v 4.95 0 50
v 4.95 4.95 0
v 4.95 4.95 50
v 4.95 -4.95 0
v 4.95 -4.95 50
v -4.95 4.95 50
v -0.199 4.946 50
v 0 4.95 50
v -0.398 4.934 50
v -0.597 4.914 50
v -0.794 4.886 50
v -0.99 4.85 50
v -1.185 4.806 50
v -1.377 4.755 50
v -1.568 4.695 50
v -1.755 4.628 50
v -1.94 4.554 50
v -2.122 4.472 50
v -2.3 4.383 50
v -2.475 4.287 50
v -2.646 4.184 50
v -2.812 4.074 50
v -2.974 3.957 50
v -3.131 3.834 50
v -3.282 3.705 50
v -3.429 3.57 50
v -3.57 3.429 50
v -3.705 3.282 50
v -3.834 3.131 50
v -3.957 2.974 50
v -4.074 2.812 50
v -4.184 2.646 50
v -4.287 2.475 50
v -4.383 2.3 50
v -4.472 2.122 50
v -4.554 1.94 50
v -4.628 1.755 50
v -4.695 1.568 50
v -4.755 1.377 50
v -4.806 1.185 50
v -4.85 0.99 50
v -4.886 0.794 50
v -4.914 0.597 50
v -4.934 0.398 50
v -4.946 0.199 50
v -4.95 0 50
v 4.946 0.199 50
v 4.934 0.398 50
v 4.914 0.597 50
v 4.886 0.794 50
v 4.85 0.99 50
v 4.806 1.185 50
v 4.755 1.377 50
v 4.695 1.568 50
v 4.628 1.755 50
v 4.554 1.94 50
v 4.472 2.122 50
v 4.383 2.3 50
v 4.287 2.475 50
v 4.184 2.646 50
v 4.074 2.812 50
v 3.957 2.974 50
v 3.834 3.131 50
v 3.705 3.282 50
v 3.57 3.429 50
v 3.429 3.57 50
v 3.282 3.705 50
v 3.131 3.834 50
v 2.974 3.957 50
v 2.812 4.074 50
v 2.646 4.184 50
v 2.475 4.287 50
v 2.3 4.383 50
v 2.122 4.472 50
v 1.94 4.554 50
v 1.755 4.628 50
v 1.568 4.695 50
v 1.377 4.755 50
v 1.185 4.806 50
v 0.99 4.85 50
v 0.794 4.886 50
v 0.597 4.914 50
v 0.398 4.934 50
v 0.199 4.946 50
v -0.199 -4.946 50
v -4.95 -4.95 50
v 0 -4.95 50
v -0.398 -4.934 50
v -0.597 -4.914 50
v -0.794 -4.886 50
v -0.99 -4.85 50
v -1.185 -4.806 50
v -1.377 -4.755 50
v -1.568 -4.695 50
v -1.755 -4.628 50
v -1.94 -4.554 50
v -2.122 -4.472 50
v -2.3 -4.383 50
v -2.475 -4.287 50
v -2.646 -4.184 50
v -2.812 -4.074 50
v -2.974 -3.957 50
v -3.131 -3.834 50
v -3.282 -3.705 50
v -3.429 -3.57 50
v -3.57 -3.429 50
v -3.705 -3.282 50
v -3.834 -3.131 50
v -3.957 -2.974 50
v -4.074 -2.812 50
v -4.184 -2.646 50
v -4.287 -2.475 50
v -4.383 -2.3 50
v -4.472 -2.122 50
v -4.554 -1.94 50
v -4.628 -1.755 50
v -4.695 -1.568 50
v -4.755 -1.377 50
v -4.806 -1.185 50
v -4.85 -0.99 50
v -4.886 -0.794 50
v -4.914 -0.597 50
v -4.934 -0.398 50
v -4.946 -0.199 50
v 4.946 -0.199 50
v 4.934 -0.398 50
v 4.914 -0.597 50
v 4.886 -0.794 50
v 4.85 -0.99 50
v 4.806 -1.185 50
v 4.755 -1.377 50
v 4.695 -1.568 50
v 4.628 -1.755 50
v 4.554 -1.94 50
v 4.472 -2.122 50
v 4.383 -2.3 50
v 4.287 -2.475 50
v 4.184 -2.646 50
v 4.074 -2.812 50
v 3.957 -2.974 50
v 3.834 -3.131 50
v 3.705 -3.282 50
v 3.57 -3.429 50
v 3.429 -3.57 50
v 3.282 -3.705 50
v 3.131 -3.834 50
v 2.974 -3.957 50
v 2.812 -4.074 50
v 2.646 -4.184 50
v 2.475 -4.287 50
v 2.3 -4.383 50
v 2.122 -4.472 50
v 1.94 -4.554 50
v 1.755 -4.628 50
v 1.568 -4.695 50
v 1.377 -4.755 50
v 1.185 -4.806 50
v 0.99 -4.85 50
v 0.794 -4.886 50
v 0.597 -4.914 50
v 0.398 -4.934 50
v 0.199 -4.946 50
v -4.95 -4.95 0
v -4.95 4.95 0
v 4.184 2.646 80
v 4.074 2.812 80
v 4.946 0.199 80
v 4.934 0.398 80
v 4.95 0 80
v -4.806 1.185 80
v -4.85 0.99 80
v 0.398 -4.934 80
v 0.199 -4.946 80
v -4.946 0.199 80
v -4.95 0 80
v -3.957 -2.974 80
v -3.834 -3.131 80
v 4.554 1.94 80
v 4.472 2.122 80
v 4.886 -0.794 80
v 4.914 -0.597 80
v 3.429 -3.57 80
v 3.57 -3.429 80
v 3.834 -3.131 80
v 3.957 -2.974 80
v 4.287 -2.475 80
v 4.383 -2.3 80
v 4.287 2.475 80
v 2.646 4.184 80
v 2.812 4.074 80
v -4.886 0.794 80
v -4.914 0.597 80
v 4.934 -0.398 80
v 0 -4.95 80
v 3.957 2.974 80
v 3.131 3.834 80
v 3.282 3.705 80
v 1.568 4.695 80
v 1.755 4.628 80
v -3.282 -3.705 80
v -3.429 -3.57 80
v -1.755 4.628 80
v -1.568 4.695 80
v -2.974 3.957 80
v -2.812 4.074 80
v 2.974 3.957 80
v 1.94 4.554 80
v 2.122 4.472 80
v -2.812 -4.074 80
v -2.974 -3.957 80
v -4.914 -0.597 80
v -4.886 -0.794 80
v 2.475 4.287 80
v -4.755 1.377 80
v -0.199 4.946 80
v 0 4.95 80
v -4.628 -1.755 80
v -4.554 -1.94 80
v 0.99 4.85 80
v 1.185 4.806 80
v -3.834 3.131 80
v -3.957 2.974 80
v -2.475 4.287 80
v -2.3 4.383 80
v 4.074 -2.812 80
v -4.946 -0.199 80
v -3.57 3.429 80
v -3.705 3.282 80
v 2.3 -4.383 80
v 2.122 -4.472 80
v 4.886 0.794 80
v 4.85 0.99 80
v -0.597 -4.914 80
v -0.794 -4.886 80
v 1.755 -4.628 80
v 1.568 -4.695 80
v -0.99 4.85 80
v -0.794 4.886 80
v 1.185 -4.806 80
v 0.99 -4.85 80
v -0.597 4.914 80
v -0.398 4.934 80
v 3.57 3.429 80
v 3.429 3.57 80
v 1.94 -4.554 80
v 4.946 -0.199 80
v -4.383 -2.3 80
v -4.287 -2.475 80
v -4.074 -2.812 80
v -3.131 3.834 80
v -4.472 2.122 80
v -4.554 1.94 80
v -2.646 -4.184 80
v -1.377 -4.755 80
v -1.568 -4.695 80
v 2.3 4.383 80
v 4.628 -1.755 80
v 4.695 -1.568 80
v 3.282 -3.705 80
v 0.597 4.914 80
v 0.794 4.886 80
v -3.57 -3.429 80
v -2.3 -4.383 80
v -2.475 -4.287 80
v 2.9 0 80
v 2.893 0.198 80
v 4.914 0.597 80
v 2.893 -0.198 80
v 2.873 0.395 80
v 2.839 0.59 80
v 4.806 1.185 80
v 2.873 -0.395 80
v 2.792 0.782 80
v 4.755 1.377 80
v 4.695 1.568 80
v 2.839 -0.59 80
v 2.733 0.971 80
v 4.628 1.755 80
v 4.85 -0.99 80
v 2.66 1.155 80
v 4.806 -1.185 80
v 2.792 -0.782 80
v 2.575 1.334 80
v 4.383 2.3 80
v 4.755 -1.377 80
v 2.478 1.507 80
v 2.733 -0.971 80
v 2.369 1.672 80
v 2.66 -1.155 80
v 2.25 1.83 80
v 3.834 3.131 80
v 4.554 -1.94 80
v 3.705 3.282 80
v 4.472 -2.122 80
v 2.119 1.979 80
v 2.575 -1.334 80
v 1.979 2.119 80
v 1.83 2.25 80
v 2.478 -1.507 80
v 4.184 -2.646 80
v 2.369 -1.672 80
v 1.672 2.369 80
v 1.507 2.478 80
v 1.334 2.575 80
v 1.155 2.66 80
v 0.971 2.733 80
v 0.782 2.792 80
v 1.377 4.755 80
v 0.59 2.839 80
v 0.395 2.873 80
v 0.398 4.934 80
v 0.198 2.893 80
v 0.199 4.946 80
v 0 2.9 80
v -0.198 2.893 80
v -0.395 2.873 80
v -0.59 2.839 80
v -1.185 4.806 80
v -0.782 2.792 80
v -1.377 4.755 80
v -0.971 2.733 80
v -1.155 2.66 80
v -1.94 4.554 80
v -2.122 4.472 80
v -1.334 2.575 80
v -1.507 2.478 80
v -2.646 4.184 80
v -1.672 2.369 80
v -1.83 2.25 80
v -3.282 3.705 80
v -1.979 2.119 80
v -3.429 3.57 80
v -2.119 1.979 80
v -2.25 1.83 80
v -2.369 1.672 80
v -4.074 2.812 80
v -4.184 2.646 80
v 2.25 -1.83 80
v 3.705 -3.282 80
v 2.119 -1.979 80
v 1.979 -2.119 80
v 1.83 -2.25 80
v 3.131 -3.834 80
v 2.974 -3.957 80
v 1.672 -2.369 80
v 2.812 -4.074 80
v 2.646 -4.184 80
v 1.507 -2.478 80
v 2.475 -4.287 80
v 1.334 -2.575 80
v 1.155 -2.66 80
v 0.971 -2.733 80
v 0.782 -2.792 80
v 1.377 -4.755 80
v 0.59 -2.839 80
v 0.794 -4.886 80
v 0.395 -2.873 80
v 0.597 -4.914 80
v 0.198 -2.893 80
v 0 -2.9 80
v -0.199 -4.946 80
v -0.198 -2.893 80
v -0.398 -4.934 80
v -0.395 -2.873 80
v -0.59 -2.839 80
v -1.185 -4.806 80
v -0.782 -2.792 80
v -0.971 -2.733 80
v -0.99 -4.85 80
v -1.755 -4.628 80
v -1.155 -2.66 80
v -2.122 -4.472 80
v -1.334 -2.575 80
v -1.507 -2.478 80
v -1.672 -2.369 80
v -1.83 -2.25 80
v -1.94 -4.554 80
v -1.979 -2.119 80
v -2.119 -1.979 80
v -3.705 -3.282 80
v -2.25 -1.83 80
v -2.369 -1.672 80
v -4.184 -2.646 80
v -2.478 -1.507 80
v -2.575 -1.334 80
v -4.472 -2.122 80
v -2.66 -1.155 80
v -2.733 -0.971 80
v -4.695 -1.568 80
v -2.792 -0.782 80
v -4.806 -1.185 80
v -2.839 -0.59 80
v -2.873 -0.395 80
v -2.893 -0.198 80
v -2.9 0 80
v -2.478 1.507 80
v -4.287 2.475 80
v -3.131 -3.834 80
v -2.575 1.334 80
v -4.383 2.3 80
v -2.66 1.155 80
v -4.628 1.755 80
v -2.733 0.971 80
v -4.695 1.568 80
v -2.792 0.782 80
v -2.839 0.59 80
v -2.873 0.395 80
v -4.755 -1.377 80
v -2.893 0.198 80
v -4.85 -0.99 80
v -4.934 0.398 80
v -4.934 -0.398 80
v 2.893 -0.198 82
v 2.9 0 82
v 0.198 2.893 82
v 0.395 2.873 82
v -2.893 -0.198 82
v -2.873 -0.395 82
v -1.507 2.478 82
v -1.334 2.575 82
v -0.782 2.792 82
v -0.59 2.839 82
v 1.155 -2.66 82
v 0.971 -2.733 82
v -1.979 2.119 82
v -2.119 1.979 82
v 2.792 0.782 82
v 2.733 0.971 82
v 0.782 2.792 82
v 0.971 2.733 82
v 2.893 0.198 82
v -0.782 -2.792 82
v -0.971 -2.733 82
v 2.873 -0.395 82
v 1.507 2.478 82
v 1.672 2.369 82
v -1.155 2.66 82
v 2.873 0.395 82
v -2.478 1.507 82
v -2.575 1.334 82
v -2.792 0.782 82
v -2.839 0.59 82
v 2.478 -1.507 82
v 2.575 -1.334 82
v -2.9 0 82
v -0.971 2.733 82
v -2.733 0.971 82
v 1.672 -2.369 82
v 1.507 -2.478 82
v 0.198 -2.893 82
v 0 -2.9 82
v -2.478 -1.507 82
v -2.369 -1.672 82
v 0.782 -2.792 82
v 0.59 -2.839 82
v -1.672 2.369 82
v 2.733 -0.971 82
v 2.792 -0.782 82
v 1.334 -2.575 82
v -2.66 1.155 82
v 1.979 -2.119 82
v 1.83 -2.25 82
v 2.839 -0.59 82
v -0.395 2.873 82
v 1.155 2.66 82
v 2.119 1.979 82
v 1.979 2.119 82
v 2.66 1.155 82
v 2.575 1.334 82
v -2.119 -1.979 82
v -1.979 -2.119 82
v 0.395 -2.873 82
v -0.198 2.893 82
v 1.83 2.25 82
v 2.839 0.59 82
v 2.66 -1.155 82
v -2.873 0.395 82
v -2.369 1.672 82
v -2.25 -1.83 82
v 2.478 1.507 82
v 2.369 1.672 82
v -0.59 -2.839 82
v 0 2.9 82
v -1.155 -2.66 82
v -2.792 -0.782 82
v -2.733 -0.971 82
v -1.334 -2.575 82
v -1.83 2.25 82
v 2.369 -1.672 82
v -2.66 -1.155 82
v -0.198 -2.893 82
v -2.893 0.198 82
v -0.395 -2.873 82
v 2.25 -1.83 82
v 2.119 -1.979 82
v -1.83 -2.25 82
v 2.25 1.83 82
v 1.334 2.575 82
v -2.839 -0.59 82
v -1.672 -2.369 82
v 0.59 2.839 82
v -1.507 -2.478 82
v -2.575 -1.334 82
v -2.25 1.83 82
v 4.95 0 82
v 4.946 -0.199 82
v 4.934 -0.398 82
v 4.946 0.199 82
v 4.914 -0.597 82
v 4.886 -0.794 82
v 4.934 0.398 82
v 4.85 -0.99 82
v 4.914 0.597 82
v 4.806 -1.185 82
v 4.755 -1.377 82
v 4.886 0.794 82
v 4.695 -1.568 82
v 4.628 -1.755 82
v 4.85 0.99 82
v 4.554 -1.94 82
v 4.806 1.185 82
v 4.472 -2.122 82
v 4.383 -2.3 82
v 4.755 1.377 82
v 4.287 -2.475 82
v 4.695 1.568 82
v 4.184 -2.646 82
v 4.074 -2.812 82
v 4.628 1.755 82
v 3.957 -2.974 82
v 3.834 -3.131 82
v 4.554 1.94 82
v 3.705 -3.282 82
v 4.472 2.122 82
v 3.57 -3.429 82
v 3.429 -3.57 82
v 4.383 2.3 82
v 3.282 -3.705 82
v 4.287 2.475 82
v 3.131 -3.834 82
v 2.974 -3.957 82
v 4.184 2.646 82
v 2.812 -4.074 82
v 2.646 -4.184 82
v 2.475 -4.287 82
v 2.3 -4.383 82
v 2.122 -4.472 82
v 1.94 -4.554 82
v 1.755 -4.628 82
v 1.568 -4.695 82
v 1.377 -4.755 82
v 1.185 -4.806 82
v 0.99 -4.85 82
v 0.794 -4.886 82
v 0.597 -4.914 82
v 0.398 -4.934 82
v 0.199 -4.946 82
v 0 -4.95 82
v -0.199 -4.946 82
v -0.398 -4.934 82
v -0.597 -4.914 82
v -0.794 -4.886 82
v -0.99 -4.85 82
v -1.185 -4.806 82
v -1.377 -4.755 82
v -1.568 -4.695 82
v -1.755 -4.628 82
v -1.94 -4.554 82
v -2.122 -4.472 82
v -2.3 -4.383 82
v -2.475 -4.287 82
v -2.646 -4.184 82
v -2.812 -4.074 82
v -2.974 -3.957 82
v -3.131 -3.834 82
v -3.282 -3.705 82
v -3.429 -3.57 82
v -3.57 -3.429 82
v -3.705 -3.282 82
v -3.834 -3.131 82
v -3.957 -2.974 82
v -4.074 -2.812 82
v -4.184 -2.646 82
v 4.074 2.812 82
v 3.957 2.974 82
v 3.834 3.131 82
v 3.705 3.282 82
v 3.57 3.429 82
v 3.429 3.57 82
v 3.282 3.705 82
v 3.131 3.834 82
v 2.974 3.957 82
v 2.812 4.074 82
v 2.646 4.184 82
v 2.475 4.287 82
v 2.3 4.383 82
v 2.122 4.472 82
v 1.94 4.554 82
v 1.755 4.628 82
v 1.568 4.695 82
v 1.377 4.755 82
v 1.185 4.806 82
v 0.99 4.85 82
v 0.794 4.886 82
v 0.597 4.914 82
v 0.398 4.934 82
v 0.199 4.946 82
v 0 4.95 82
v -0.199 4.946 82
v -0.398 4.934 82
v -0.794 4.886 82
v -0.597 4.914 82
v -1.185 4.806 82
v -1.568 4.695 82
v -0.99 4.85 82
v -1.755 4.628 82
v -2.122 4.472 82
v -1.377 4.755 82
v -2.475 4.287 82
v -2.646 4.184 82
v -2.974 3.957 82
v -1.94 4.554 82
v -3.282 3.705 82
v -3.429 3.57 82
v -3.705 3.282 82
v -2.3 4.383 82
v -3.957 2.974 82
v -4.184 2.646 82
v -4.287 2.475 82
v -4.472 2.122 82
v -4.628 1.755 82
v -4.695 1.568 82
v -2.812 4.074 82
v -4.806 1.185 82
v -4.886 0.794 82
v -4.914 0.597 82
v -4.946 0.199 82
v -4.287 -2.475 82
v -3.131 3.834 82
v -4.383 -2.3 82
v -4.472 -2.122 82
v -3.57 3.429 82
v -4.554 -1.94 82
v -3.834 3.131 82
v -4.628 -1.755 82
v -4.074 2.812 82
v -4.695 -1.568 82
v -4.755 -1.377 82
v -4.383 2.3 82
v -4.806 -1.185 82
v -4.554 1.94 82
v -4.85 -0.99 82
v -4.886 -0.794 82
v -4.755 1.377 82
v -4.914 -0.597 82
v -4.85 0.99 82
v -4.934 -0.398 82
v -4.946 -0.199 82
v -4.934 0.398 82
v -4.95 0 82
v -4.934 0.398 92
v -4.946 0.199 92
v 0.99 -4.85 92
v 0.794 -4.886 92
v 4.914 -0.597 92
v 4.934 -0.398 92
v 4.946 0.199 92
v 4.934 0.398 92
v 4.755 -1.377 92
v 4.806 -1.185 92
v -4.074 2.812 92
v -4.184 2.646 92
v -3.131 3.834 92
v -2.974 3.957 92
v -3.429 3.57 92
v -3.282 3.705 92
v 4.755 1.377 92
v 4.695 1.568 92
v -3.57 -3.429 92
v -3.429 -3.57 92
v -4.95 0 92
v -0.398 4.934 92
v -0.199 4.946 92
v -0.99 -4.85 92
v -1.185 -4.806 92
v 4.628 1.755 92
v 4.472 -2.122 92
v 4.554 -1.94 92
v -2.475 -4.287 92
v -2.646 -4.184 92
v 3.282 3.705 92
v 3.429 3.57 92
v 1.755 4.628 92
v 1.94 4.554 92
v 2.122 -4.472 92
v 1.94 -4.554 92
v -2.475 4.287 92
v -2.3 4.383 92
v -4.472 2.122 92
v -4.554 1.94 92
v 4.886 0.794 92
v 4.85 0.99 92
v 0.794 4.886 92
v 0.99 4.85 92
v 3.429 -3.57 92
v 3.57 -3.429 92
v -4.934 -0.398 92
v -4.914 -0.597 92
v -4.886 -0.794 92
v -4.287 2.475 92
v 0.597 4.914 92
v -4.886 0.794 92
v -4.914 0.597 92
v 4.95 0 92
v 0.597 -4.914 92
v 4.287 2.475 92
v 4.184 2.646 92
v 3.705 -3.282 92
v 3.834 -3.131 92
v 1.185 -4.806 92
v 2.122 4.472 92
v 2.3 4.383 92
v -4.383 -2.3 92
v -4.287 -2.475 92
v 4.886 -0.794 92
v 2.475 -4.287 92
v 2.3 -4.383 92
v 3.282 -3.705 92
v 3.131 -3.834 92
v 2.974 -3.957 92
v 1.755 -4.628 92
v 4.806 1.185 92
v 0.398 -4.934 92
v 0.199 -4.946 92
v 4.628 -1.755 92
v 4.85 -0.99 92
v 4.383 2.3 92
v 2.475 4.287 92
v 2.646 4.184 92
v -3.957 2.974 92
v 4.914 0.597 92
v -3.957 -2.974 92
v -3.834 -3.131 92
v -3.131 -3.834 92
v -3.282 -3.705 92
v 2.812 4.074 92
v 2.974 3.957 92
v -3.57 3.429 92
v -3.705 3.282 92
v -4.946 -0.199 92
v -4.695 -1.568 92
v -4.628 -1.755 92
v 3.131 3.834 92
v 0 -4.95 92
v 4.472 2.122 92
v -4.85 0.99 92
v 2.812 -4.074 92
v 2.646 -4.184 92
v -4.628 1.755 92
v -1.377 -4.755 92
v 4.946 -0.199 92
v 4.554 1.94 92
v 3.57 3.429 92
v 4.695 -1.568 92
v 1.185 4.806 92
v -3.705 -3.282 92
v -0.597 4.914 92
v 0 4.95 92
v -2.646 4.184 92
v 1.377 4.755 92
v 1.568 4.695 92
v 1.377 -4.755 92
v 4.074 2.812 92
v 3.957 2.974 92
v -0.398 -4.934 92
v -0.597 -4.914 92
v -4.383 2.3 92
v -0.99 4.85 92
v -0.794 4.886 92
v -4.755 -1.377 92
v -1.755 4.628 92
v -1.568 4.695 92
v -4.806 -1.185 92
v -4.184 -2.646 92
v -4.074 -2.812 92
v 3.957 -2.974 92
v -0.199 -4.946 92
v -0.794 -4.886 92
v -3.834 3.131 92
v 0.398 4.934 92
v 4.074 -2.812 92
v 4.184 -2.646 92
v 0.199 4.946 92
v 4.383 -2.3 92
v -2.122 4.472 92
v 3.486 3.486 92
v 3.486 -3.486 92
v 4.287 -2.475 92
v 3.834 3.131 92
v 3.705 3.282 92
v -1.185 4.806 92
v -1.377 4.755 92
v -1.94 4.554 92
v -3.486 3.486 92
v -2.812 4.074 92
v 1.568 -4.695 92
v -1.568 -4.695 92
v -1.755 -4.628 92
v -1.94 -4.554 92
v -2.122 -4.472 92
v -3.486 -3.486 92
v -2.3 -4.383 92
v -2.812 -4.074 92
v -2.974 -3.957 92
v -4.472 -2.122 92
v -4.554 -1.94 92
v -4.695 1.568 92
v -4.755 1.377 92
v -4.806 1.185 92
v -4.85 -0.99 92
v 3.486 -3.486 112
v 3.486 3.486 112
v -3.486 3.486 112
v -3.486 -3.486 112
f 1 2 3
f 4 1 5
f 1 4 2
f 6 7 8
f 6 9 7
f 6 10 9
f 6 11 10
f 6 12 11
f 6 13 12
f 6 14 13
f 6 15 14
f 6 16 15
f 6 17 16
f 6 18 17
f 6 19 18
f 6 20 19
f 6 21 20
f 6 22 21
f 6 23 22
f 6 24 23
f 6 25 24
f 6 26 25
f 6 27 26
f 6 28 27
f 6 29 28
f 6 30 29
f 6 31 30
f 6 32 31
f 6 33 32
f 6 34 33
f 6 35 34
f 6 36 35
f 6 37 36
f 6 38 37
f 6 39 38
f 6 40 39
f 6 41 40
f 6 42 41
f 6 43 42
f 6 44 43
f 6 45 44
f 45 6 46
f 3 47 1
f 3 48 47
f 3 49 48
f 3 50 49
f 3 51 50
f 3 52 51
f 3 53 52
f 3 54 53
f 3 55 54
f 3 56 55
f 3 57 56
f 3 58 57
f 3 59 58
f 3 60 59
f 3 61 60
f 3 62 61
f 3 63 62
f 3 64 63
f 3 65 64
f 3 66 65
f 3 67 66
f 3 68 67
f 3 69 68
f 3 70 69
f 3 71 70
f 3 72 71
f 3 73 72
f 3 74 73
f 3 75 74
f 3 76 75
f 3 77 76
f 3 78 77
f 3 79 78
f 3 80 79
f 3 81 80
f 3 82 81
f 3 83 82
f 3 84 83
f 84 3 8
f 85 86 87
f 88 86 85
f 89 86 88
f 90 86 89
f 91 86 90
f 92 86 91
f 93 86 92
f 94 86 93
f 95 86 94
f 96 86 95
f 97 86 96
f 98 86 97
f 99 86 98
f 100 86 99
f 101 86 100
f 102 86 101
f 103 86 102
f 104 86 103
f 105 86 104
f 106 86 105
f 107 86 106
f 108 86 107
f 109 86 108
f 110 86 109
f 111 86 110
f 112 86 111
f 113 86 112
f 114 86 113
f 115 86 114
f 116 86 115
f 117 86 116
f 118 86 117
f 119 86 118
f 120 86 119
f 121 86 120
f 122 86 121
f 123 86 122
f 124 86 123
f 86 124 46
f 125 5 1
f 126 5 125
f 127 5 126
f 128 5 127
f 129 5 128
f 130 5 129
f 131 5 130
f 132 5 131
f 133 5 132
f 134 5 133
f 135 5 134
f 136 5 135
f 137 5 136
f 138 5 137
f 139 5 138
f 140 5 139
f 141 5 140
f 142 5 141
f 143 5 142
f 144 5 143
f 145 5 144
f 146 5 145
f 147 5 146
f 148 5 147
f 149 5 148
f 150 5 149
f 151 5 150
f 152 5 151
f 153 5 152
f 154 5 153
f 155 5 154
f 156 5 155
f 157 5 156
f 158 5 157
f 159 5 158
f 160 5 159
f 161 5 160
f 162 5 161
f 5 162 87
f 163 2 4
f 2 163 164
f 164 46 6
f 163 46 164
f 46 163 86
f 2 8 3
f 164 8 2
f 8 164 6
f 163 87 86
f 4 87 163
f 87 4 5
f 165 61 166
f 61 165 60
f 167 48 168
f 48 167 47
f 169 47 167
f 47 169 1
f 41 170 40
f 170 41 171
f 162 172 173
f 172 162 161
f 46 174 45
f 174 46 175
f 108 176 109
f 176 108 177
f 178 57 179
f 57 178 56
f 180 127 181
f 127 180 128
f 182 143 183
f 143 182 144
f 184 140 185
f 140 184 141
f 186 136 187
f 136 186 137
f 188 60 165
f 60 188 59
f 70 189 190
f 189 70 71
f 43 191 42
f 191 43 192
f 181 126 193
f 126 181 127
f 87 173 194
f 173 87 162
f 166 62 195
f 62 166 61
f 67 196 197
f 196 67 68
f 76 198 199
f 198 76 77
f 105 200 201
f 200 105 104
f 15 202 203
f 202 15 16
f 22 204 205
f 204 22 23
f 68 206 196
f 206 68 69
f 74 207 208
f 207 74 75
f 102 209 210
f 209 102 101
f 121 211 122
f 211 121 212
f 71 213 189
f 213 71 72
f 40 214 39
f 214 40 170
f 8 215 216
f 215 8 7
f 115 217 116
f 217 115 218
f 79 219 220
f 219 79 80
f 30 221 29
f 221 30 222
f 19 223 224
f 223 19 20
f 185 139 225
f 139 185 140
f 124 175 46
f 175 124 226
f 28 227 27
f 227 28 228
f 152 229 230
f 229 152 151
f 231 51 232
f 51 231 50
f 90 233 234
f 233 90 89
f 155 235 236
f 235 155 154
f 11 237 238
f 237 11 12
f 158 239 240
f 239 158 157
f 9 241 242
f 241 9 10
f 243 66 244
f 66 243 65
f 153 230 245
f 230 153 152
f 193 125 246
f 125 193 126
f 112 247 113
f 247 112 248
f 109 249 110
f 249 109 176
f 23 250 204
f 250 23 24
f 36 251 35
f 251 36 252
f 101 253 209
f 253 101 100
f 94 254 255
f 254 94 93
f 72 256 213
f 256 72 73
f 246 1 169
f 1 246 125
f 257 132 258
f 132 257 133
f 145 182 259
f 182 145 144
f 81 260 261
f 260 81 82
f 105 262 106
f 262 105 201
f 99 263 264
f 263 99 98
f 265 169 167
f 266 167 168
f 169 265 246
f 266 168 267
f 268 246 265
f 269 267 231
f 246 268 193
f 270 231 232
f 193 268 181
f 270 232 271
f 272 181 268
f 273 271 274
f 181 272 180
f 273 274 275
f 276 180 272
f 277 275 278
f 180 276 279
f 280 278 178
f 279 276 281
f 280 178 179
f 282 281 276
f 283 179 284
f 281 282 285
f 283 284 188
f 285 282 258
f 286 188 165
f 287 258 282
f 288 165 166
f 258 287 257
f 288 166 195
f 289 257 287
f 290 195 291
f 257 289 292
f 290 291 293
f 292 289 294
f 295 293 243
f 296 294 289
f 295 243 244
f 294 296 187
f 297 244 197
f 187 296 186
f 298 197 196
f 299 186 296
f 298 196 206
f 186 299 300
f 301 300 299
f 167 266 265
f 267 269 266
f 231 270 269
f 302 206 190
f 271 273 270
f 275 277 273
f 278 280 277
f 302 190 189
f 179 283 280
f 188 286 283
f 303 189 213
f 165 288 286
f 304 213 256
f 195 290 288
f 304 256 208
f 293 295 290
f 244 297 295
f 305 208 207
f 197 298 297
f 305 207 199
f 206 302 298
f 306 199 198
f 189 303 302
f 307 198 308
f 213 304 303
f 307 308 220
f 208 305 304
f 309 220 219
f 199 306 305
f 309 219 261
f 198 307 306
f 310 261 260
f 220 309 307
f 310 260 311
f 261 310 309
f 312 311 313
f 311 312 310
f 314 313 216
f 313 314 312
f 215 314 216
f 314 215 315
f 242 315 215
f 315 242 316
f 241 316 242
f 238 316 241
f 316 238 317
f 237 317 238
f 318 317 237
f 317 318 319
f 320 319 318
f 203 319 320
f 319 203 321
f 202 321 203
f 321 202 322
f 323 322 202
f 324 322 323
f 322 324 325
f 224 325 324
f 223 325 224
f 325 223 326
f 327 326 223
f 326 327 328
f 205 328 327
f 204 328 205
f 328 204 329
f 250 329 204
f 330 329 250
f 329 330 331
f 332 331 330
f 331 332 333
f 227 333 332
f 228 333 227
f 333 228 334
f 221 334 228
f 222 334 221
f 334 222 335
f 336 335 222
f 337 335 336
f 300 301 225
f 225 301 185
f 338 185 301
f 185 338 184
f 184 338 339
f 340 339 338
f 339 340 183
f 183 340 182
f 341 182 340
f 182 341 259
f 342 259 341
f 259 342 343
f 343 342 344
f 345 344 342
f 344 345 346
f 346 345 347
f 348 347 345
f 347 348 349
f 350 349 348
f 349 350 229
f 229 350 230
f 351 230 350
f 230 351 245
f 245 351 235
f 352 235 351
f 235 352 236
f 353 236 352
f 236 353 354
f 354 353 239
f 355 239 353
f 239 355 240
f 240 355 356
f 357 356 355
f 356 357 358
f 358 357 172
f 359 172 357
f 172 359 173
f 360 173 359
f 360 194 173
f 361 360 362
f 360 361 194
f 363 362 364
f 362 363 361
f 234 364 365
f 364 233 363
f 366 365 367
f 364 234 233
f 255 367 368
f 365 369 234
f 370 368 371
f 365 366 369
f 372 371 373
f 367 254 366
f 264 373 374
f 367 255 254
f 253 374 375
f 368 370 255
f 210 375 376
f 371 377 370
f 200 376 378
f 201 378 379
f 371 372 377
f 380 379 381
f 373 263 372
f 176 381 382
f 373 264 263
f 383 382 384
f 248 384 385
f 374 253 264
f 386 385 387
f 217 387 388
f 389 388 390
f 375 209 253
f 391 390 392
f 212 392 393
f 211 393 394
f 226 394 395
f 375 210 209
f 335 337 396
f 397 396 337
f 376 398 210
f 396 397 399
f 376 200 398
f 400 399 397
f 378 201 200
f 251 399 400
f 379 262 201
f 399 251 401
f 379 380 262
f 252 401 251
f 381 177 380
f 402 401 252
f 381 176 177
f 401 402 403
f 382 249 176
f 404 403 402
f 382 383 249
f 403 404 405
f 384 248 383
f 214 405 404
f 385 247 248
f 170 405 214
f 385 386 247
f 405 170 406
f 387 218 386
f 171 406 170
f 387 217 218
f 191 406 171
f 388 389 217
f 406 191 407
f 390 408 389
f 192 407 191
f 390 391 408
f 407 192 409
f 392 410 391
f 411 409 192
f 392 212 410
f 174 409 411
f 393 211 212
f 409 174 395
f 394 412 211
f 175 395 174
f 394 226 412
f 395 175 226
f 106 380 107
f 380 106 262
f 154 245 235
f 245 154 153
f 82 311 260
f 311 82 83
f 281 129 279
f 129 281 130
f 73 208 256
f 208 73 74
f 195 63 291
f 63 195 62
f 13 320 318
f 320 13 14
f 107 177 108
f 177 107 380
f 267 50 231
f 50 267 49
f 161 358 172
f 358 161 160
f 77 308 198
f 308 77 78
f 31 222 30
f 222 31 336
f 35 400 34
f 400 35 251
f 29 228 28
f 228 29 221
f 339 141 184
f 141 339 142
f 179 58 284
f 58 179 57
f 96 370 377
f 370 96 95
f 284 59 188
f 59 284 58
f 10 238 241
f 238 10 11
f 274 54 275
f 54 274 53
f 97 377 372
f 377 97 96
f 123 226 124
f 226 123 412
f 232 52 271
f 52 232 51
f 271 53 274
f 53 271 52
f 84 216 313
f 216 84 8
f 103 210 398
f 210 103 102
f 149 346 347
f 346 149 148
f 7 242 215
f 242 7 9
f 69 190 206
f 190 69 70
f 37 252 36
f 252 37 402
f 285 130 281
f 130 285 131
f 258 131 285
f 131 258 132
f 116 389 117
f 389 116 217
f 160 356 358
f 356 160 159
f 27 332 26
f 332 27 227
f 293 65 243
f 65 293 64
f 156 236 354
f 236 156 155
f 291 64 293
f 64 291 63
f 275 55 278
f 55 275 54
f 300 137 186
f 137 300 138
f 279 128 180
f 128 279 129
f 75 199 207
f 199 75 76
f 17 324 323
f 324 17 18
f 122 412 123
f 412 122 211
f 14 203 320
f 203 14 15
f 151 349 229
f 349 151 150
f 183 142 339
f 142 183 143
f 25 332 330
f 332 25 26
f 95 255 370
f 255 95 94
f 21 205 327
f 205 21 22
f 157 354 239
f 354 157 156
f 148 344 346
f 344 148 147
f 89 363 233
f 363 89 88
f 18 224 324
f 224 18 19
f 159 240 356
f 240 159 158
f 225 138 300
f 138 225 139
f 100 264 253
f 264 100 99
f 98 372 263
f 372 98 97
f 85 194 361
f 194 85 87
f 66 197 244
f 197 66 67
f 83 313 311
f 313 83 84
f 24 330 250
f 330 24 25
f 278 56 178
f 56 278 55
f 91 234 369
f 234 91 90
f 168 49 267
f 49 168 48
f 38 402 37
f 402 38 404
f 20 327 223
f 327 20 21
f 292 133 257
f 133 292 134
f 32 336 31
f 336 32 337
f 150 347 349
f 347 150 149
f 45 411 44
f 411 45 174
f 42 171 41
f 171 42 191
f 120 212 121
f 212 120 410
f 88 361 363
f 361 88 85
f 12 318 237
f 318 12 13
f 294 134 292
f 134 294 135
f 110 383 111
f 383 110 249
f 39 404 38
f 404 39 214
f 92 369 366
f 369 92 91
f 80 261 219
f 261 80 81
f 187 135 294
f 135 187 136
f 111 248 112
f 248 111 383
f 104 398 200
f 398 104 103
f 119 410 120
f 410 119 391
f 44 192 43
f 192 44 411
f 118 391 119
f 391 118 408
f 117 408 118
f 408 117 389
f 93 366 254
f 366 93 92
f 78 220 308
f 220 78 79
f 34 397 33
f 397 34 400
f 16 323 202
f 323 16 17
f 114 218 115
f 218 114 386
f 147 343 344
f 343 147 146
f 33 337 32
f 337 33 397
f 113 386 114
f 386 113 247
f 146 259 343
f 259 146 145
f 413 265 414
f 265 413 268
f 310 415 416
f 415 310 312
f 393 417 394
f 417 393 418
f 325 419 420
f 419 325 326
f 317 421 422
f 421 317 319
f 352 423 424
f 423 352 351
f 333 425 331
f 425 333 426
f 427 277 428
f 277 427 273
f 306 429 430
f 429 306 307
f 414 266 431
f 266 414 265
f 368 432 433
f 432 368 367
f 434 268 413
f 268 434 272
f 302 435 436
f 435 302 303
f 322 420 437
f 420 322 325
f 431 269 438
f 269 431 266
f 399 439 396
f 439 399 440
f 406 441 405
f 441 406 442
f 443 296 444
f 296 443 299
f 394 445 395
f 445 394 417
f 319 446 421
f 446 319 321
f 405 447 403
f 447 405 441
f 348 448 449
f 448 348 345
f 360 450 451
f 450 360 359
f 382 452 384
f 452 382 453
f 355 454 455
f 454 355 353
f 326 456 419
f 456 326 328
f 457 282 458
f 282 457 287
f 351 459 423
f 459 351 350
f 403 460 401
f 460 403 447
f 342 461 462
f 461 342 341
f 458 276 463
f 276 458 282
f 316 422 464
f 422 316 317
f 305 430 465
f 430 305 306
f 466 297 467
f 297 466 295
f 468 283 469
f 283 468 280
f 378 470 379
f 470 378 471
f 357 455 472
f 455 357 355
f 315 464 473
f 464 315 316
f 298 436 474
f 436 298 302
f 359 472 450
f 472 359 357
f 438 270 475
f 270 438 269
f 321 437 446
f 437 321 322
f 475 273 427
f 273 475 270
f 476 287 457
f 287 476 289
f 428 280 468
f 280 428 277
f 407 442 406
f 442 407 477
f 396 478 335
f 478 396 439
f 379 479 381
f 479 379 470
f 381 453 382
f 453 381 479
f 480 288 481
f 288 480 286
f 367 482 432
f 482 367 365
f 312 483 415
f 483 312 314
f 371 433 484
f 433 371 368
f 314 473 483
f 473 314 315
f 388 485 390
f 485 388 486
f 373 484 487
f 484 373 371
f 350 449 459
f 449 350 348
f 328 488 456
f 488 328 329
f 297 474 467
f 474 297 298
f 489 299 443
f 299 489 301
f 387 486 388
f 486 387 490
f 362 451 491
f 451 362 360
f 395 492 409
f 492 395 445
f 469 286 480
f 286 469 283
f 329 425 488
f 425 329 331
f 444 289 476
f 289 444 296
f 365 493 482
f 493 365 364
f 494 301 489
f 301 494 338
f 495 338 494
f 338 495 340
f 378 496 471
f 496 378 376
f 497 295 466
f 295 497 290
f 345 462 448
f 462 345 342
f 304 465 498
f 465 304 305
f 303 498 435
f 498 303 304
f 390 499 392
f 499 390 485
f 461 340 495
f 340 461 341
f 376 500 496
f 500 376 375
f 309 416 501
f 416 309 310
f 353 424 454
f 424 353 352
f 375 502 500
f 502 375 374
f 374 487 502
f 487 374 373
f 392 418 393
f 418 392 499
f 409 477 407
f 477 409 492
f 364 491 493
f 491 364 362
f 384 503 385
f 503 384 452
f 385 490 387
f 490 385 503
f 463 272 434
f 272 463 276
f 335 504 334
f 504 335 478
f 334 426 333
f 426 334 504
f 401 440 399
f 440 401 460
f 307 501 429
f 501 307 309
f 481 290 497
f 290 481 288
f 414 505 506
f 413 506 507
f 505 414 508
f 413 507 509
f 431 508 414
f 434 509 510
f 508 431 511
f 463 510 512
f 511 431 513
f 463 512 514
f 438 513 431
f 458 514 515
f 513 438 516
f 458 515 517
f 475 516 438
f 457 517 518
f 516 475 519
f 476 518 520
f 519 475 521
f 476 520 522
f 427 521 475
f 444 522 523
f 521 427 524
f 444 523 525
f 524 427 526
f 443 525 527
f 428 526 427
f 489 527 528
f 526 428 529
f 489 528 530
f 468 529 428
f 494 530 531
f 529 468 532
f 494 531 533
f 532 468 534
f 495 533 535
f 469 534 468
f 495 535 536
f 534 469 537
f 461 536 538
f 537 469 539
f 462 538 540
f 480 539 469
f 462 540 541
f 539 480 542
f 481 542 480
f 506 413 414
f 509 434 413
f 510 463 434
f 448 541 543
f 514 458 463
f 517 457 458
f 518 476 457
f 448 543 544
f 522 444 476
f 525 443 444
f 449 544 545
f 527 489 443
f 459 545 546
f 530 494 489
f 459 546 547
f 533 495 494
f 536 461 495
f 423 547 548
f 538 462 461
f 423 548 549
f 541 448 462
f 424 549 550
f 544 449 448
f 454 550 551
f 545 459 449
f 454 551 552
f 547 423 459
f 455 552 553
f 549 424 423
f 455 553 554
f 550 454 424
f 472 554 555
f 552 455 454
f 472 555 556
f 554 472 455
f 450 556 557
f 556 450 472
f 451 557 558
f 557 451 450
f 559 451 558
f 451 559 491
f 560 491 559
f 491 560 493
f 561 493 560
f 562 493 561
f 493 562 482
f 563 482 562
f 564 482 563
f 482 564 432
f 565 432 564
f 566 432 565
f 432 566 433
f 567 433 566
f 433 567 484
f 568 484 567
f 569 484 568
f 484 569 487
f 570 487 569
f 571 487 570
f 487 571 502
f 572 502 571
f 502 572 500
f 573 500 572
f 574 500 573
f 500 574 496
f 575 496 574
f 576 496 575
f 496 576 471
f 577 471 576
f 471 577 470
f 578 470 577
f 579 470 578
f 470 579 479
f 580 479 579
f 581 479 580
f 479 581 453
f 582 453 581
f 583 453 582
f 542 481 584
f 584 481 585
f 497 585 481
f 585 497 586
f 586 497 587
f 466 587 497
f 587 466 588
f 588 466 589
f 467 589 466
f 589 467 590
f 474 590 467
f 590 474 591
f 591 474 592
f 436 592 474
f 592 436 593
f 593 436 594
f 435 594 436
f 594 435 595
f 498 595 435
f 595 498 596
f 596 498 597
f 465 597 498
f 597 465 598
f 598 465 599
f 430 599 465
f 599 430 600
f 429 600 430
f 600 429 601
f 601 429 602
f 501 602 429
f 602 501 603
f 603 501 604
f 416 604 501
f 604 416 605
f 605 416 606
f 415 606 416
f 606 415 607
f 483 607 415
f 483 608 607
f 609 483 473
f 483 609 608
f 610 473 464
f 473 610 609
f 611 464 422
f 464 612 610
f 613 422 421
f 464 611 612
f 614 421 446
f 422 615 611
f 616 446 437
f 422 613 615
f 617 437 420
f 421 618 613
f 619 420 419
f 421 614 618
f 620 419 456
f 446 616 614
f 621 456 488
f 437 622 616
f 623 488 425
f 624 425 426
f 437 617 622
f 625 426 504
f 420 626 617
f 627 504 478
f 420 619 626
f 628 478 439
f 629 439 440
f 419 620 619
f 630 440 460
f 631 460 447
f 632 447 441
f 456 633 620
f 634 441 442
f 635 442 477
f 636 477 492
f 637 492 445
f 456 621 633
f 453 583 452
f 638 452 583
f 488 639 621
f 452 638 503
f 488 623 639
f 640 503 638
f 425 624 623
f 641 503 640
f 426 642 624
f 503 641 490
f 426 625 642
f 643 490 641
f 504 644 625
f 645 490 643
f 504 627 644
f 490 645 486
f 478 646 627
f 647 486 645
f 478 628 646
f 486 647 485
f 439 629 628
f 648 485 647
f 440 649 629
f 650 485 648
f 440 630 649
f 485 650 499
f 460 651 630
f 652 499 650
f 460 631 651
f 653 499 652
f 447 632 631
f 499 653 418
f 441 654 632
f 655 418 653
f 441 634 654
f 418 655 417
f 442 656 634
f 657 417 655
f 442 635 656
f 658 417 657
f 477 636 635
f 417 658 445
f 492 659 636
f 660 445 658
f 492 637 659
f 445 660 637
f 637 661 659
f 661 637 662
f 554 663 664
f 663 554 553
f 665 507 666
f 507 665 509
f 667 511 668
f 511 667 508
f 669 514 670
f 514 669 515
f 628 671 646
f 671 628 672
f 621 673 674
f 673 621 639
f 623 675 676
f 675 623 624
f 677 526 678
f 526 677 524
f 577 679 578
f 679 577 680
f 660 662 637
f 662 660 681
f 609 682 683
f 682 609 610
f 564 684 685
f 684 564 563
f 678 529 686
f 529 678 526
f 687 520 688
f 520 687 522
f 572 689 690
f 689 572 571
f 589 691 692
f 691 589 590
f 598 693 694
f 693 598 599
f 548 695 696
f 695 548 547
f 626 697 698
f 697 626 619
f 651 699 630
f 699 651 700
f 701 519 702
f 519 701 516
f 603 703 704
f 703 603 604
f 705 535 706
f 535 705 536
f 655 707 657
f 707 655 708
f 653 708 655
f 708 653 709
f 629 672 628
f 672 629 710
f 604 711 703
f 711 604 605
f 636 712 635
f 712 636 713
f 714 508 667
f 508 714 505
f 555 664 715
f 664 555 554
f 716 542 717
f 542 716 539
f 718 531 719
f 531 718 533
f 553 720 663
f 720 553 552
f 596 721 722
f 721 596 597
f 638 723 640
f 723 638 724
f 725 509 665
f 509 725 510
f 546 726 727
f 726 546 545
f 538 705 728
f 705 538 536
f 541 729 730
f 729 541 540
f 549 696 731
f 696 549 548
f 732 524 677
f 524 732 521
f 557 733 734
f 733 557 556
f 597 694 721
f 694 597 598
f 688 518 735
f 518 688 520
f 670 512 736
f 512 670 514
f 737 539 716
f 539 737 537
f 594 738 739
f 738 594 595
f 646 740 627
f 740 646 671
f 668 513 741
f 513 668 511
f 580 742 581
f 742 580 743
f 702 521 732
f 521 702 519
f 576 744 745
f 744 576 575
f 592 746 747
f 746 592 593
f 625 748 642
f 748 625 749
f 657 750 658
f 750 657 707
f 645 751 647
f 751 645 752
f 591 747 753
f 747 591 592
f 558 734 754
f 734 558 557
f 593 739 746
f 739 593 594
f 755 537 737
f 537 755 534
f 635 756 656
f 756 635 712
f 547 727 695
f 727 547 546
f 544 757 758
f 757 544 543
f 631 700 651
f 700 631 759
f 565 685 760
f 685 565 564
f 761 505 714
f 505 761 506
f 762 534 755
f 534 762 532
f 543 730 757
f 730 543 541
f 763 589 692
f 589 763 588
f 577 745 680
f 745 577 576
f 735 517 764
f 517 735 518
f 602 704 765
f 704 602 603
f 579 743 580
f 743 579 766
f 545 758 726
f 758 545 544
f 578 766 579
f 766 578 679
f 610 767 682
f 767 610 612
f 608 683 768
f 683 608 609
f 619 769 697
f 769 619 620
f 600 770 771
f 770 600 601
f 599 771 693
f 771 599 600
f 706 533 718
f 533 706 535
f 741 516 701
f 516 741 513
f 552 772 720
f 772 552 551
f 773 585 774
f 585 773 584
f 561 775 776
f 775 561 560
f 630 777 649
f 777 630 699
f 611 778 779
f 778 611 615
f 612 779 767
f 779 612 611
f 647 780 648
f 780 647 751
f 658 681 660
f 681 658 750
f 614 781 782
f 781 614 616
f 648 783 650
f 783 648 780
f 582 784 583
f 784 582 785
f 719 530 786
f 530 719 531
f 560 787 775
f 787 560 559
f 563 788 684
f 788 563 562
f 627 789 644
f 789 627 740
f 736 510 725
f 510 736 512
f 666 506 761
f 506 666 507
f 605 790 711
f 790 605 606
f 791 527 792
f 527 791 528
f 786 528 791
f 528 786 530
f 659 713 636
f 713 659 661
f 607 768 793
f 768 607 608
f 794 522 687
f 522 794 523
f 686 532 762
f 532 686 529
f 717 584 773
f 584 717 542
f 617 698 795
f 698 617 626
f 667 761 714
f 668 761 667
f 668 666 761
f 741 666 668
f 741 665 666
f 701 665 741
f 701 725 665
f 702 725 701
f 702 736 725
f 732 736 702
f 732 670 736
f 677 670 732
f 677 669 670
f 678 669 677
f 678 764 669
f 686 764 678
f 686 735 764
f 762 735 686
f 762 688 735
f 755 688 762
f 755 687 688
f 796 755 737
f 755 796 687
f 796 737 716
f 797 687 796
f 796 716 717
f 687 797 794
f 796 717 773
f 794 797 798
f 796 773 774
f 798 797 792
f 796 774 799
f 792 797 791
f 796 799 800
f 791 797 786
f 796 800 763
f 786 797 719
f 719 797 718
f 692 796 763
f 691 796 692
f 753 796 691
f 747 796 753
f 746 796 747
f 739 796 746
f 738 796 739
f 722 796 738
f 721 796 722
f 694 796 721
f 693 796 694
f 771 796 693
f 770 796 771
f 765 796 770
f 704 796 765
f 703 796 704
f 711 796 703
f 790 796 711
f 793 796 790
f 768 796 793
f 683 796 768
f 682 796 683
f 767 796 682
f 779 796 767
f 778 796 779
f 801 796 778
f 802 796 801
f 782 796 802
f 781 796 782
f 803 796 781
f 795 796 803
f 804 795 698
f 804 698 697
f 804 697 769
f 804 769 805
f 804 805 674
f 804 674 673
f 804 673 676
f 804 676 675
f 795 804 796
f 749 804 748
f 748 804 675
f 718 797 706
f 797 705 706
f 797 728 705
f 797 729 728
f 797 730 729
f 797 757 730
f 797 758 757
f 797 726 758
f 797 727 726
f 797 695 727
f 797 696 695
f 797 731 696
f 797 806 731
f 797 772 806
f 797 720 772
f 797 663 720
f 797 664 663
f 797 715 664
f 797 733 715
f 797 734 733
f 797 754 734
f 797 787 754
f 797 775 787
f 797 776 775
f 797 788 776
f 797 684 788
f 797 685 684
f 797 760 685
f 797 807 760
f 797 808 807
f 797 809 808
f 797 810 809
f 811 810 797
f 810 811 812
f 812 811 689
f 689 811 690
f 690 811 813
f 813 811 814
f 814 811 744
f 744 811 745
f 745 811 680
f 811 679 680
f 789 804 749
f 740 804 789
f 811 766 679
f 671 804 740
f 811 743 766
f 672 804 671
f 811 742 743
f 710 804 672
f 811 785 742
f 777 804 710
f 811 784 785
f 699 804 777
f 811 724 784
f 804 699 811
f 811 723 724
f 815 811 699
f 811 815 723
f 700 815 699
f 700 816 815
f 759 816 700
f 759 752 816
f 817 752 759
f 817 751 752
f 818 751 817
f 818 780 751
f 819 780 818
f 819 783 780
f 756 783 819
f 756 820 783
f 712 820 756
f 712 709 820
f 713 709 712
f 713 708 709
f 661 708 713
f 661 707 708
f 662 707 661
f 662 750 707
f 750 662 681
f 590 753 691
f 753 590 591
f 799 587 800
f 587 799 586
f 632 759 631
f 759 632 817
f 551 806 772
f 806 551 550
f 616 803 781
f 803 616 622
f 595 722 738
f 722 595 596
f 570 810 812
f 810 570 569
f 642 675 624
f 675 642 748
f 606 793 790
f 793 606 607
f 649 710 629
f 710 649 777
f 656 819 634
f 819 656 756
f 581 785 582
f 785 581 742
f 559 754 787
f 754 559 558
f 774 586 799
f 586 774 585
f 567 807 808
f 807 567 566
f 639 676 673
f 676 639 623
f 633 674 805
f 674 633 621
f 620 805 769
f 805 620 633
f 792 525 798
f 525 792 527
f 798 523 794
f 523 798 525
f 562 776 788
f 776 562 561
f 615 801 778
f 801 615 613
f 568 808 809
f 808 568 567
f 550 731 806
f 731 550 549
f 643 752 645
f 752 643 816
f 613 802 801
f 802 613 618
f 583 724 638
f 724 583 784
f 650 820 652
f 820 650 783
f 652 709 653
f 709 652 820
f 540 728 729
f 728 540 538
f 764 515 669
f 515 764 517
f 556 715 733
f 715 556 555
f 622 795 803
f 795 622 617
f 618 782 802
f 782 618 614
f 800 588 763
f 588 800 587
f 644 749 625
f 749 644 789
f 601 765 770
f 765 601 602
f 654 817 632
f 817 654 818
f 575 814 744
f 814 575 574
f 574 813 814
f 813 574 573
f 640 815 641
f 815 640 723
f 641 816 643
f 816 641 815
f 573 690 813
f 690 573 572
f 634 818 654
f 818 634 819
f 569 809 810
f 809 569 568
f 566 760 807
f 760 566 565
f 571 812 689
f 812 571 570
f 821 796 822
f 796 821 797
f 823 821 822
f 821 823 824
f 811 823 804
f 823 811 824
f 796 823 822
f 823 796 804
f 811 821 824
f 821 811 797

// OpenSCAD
// file: config.scad
$fa = 1;
$fs = 0.2;

bearing_outer_dia = 22;
bearing_inner_dia = 10;
bearing_padding = 8;

casing_width = 10;

post_height = 100;
post_base_height = 20;
post_groove_width = 4;
post_groove_depth = 4;
post_groove_offset = 4;

base_margin = 5;
post_base_width = casing_width;
post_length = 2*(post_groove_offset + post_groove_depth + bearing_padding) + bearing_outer_dia;
post_separation = 210;

base_length = post_length + 2 * base_margin;
base_width = post_separation + 2 * base_margin;
base_height = 10;

// groove to groove distance
casing_length = 2*(post_groove_depth + bearing_padding) + bearing_outer_dia;
casing_height = 1.5 * bearing_padding + bearing_outer_dia;

roller_width = 200;
roller_padding = post_separation - roller_width;
roller_stem_protrusion = 20;
roller_groove_toroid_radius = 2;
roller_stem_depth = 50;
// main file
include<config.scad>

delta = 0.05;

translate(v = [0, 0, roller_stem_depth/2]) 
cube([bearing_inner_dia-2*delta, bearing_inner_dia-2*delta, roller_stem_depth], center = true);

translate(v = [0,0, roller_stem_depth])
cylinder(r = bearing_inner_dia/2 - delta, h = roller_padding + casing_width + roller_stem_protrusion/2);

translate(v = [0, 0, roller_stem_depth + roller_padding + casing_width + roller_stem_protrusion/2])
cylinder(r = bearing_inner_dia/2 - roller_groove_toroid_radius - delta - delta, h = roller_groove_toroid_radius);

translate(v = [0, 0, roller_stem_depth + roller_padding + casing_width + roller_stem_protrusion/2 + roller_groove_toroid_radius])
cylinder(r = bearing_inner_dia/2 - delta, h = roller_stem_protrusion/2);

// comment
translate(v = [0, 0, roller_stem_depth + roller_padding + casing_width + roller_stem_protrusion + roller_groove_toroid_radius + roller_stem_protrusion/2])
cube([bearing_inner_dia/sqrt(2)-2*delta, bearing_inner_dia/sqrt(2)-2*delta, roller_stem_protrusion], center = true);
